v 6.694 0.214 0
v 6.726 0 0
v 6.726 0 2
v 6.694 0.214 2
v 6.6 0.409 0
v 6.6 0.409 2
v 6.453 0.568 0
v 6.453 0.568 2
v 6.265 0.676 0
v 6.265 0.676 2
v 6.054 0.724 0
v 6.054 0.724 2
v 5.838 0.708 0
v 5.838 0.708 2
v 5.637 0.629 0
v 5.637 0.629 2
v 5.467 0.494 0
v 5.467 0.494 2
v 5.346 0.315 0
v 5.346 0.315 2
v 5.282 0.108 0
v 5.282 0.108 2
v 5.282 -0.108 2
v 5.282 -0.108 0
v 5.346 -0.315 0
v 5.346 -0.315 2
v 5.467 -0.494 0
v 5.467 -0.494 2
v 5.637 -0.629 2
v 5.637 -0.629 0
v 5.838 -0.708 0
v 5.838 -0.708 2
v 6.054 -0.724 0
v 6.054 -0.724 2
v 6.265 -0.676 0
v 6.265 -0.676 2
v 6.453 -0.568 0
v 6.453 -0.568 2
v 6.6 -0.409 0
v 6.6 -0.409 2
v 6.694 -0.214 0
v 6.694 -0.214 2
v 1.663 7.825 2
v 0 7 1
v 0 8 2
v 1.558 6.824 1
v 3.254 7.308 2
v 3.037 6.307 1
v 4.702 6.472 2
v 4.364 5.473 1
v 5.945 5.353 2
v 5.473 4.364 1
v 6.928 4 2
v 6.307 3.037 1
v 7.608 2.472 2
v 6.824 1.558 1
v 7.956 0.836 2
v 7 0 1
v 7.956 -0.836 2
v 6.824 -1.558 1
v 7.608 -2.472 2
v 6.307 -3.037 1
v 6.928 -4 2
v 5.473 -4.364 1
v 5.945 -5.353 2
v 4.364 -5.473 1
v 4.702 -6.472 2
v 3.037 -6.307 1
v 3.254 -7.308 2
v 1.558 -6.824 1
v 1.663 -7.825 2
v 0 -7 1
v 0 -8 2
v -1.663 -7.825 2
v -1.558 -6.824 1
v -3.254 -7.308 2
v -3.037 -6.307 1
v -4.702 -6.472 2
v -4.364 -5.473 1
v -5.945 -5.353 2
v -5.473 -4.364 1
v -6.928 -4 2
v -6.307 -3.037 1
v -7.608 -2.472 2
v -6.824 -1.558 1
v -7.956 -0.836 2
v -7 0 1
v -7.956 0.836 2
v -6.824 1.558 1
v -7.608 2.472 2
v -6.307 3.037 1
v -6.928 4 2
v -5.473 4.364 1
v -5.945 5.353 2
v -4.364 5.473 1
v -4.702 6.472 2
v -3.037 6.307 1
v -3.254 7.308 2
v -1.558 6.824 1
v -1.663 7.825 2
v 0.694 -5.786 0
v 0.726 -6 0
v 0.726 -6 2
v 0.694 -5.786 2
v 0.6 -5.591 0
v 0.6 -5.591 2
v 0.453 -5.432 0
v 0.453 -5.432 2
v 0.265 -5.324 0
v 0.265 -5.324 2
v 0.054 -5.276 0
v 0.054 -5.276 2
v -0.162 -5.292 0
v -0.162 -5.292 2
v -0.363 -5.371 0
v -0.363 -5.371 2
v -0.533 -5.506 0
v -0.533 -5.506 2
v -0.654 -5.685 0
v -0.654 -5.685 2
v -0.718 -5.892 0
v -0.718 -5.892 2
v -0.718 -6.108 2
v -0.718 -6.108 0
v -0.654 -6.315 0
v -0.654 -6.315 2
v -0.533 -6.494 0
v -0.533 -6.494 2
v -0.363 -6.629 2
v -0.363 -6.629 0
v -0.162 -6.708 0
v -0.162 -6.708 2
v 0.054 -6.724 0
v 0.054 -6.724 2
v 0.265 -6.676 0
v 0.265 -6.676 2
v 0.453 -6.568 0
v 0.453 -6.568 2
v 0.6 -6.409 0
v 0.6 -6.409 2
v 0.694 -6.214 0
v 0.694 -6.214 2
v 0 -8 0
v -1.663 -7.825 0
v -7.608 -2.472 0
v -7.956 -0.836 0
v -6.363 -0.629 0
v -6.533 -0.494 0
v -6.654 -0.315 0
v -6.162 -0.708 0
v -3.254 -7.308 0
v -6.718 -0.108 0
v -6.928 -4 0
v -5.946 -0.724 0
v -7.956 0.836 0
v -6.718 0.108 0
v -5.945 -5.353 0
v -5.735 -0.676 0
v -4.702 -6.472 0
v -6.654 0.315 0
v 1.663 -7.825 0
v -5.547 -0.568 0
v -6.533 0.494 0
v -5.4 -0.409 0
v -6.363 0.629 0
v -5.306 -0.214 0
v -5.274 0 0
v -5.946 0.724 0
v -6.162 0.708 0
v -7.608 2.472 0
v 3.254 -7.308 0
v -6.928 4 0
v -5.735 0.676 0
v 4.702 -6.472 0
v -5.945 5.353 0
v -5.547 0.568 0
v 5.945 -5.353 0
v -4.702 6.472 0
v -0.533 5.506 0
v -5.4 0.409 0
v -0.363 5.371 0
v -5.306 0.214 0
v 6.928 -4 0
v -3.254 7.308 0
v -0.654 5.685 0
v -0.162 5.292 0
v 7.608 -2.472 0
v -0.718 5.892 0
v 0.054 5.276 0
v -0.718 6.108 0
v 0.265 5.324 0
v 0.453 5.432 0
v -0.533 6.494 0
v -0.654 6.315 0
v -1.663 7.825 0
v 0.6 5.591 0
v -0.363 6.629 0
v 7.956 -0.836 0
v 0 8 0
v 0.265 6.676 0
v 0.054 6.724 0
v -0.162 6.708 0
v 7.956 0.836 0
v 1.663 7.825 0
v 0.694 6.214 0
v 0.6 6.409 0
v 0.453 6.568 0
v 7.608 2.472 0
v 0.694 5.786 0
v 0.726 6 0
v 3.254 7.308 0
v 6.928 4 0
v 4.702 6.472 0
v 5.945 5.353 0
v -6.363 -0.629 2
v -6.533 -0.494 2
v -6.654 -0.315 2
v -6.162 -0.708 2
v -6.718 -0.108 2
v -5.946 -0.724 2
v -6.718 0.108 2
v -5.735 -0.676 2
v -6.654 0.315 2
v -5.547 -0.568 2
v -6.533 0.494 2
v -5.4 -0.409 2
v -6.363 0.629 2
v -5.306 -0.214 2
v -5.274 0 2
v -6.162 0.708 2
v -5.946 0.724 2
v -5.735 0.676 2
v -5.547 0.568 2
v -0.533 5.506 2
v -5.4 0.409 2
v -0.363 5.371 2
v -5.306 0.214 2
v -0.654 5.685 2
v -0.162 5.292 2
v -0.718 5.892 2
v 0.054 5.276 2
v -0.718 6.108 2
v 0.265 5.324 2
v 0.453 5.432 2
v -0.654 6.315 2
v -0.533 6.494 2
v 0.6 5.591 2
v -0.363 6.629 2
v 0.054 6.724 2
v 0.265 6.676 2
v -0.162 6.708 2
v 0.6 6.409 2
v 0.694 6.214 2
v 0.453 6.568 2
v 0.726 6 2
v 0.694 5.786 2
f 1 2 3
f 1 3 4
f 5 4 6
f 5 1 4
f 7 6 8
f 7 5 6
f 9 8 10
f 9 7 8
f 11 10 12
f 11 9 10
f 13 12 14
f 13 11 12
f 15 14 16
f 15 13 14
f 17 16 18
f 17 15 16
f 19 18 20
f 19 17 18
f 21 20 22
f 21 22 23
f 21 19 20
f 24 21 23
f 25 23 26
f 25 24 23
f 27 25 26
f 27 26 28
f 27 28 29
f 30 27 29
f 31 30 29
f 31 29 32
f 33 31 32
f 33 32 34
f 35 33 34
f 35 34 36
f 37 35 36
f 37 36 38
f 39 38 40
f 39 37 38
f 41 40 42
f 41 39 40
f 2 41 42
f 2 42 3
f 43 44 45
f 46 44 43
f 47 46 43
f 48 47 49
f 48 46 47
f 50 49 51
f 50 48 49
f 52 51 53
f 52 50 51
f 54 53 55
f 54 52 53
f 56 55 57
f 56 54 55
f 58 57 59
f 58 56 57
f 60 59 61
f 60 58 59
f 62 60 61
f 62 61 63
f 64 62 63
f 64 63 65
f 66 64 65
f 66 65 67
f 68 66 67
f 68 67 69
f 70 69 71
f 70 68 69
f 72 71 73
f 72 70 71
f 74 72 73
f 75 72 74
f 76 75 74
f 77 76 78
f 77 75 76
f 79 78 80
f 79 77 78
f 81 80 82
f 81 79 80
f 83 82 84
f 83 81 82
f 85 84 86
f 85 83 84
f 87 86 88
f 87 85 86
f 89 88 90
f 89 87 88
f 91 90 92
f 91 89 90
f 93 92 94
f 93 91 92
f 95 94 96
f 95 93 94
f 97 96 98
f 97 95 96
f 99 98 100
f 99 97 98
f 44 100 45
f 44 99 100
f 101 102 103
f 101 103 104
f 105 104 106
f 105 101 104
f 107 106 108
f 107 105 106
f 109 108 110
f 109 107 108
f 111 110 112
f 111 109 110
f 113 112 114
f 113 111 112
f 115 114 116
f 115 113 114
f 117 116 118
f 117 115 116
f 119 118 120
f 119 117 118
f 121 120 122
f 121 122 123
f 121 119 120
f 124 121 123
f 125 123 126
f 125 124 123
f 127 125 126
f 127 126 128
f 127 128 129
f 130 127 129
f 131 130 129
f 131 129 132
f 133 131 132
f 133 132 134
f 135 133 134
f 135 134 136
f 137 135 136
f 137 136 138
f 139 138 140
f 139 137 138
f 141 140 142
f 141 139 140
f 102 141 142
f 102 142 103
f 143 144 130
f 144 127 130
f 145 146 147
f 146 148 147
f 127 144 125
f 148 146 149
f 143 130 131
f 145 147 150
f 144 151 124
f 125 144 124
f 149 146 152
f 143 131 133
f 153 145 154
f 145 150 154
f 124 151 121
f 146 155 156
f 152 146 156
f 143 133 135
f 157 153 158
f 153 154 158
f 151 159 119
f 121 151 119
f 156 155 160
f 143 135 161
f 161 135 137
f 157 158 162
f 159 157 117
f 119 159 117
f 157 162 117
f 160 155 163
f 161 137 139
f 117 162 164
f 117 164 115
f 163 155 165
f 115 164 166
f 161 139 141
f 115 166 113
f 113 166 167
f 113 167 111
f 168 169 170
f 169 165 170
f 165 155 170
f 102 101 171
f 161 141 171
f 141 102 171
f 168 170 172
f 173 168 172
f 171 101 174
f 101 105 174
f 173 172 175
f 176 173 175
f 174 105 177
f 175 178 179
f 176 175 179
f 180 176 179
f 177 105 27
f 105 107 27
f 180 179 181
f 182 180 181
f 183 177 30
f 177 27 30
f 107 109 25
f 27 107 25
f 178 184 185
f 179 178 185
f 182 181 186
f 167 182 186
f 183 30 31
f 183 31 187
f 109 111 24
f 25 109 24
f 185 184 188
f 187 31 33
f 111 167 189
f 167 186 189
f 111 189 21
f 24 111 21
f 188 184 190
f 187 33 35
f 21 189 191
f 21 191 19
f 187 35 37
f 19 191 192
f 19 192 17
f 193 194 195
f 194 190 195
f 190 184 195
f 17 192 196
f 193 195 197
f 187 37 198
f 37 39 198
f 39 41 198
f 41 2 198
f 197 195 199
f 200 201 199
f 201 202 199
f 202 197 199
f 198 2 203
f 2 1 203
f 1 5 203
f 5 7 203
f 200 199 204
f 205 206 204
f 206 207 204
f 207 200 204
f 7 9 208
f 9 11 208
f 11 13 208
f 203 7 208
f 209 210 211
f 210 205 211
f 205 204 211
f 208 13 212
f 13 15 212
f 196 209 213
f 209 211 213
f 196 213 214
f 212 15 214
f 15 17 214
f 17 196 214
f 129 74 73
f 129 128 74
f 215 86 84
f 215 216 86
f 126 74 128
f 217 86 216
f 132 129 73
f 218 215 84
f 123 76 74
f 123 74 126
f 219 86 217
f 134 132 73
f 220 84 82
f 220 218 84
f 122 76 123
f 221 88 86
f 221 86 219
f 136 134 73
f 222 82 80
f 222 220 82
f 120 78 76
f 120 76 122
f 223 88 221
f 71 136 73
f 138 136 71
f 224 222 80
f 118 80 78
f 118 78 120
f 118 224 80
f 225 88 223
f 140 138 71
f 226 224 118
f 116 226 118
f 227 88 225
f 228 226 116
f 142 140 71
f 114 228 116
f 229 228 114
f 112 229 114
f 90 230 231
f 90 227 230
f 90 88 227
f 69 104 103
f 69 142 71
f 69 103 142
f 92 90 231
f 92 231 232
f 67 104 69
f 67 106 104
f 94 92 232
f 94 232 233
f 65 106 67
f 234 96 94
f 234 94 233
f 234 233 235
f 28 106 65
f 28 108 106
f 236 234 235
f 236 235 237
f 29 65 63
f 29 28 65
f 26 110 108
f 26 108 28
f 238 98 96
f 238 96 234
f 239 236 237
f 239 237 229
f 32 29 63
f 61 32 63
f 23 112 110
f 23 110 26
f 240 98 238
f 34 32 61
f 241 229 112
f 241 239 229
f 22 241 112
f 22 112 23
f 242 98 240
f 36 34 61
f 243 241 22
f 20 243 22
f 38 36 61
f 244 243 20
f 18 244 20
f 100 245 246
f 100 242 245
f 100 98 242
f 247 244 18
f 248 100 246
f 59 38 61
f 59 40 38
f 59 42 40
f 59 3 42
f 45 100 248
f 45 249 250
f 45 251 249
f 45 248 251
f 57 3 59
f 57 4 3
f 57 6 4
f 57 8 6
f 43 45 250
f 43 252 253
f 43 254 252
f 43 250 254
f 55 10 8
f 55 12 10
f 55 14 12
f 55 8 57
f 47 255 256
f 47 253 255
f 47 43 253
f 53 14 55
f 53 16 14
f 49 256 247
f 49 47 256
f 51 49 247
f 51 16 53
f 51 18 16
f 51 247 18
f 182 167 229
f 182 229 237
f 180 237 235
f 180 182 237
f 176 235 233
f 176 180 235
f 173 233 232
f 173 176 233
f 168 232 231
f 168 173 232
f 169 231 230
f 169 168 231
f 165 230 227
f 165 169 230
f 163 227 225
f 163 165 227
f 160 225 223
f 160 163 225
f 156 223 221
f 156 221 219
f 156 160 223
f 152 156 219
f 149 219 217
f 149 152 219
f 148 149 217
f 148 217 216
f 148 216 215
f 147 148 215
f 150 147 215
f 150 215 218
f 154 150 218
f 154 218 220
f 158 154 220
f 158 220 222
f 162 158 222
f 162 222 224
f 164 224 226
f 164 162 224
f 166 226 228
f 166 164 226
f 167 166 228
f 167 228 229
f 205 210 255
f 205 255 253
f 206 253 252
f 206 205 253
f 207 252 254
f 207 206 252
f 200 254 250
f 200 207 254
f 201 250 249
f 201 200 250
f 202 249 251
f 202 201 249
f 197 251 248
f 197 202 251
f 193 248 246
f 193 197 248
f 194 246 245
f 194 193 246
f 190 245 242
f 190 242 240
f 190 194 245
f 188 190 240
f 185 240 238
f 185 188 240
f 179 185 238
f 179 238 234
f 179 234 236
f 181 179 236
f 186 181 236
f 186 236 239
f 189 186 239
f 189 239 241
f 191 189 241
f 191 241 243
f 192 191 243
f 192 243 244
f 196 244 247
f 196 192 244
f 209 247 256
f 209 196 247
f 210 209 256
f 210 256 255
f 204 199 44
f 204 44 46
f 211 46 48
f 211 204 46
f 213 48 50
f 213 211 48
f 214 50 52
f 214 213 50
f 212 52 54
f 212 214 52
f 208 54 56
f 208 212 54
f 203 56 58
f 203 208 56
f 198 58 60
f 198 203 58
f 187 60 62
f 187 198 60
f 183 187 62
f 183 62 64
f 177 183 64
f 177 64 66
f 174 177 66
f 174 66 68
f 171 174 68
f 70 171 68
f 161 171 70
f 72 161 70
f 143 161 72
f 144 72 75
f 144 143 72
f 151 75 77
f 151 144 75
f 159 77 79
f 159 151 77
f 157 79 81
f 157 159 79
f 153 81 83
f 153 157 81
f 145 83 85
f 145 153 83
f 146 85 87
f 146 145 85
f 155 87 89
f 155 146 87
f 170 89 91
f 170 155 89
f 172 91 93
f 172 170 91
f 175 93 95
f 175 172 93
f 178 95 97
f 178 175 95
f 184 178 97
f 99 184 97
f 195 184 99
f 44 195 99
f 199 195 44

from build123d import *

# Parameters (mm, degrees)
SKETCH1_R           = 8
BOSS_EXTRUDE1_DEPTH = 2
SKETCH2_R           = 0.726422571
CUT_EXTRUDE1_DEPTH  = 2


with BuildPart() as part:
    # Sketch1 → Boss-Extrude1 (new body)
    with BuildSketch(Plane.XY):
        Circle(SKETCH1_R)
    extrude(amount=BOSS_EXTRUDE1_DEPTH)

    # Sketch2 → Cut-Extrude1 (cut)
    with BuildSketch(Plane.XY):
        with Locations((-6, 0)):
            Circle(SKETCH2_R)
        with Locations((0, 6)):
            Circle(SKETCH2_R)
        with Locations((6, 0)):
            Circle(SKETCH2_R)
        with Locations((0, -6)):
            Circle(SKETCH2_R)
    extrude(amount=CUT_EXTRUDE1_DEPTH, mode=Mode.SUBTRACT)

    # Sketch3 → Cut-Revolve1 (revolve, cut)
    with BuildSketch(Plane(origin=(0, 0, 0), x_dir=(0, 0, -1), z_dir=(1, 0, 0))):
        Polygon((-2, 8), (-1, 7), (0, 8), align=None)
    revolve(axis=Axis((0, 0, 3.502327543), (0, 0, -1)), mode=Mode.SUBTRACT)


solid = part.part
